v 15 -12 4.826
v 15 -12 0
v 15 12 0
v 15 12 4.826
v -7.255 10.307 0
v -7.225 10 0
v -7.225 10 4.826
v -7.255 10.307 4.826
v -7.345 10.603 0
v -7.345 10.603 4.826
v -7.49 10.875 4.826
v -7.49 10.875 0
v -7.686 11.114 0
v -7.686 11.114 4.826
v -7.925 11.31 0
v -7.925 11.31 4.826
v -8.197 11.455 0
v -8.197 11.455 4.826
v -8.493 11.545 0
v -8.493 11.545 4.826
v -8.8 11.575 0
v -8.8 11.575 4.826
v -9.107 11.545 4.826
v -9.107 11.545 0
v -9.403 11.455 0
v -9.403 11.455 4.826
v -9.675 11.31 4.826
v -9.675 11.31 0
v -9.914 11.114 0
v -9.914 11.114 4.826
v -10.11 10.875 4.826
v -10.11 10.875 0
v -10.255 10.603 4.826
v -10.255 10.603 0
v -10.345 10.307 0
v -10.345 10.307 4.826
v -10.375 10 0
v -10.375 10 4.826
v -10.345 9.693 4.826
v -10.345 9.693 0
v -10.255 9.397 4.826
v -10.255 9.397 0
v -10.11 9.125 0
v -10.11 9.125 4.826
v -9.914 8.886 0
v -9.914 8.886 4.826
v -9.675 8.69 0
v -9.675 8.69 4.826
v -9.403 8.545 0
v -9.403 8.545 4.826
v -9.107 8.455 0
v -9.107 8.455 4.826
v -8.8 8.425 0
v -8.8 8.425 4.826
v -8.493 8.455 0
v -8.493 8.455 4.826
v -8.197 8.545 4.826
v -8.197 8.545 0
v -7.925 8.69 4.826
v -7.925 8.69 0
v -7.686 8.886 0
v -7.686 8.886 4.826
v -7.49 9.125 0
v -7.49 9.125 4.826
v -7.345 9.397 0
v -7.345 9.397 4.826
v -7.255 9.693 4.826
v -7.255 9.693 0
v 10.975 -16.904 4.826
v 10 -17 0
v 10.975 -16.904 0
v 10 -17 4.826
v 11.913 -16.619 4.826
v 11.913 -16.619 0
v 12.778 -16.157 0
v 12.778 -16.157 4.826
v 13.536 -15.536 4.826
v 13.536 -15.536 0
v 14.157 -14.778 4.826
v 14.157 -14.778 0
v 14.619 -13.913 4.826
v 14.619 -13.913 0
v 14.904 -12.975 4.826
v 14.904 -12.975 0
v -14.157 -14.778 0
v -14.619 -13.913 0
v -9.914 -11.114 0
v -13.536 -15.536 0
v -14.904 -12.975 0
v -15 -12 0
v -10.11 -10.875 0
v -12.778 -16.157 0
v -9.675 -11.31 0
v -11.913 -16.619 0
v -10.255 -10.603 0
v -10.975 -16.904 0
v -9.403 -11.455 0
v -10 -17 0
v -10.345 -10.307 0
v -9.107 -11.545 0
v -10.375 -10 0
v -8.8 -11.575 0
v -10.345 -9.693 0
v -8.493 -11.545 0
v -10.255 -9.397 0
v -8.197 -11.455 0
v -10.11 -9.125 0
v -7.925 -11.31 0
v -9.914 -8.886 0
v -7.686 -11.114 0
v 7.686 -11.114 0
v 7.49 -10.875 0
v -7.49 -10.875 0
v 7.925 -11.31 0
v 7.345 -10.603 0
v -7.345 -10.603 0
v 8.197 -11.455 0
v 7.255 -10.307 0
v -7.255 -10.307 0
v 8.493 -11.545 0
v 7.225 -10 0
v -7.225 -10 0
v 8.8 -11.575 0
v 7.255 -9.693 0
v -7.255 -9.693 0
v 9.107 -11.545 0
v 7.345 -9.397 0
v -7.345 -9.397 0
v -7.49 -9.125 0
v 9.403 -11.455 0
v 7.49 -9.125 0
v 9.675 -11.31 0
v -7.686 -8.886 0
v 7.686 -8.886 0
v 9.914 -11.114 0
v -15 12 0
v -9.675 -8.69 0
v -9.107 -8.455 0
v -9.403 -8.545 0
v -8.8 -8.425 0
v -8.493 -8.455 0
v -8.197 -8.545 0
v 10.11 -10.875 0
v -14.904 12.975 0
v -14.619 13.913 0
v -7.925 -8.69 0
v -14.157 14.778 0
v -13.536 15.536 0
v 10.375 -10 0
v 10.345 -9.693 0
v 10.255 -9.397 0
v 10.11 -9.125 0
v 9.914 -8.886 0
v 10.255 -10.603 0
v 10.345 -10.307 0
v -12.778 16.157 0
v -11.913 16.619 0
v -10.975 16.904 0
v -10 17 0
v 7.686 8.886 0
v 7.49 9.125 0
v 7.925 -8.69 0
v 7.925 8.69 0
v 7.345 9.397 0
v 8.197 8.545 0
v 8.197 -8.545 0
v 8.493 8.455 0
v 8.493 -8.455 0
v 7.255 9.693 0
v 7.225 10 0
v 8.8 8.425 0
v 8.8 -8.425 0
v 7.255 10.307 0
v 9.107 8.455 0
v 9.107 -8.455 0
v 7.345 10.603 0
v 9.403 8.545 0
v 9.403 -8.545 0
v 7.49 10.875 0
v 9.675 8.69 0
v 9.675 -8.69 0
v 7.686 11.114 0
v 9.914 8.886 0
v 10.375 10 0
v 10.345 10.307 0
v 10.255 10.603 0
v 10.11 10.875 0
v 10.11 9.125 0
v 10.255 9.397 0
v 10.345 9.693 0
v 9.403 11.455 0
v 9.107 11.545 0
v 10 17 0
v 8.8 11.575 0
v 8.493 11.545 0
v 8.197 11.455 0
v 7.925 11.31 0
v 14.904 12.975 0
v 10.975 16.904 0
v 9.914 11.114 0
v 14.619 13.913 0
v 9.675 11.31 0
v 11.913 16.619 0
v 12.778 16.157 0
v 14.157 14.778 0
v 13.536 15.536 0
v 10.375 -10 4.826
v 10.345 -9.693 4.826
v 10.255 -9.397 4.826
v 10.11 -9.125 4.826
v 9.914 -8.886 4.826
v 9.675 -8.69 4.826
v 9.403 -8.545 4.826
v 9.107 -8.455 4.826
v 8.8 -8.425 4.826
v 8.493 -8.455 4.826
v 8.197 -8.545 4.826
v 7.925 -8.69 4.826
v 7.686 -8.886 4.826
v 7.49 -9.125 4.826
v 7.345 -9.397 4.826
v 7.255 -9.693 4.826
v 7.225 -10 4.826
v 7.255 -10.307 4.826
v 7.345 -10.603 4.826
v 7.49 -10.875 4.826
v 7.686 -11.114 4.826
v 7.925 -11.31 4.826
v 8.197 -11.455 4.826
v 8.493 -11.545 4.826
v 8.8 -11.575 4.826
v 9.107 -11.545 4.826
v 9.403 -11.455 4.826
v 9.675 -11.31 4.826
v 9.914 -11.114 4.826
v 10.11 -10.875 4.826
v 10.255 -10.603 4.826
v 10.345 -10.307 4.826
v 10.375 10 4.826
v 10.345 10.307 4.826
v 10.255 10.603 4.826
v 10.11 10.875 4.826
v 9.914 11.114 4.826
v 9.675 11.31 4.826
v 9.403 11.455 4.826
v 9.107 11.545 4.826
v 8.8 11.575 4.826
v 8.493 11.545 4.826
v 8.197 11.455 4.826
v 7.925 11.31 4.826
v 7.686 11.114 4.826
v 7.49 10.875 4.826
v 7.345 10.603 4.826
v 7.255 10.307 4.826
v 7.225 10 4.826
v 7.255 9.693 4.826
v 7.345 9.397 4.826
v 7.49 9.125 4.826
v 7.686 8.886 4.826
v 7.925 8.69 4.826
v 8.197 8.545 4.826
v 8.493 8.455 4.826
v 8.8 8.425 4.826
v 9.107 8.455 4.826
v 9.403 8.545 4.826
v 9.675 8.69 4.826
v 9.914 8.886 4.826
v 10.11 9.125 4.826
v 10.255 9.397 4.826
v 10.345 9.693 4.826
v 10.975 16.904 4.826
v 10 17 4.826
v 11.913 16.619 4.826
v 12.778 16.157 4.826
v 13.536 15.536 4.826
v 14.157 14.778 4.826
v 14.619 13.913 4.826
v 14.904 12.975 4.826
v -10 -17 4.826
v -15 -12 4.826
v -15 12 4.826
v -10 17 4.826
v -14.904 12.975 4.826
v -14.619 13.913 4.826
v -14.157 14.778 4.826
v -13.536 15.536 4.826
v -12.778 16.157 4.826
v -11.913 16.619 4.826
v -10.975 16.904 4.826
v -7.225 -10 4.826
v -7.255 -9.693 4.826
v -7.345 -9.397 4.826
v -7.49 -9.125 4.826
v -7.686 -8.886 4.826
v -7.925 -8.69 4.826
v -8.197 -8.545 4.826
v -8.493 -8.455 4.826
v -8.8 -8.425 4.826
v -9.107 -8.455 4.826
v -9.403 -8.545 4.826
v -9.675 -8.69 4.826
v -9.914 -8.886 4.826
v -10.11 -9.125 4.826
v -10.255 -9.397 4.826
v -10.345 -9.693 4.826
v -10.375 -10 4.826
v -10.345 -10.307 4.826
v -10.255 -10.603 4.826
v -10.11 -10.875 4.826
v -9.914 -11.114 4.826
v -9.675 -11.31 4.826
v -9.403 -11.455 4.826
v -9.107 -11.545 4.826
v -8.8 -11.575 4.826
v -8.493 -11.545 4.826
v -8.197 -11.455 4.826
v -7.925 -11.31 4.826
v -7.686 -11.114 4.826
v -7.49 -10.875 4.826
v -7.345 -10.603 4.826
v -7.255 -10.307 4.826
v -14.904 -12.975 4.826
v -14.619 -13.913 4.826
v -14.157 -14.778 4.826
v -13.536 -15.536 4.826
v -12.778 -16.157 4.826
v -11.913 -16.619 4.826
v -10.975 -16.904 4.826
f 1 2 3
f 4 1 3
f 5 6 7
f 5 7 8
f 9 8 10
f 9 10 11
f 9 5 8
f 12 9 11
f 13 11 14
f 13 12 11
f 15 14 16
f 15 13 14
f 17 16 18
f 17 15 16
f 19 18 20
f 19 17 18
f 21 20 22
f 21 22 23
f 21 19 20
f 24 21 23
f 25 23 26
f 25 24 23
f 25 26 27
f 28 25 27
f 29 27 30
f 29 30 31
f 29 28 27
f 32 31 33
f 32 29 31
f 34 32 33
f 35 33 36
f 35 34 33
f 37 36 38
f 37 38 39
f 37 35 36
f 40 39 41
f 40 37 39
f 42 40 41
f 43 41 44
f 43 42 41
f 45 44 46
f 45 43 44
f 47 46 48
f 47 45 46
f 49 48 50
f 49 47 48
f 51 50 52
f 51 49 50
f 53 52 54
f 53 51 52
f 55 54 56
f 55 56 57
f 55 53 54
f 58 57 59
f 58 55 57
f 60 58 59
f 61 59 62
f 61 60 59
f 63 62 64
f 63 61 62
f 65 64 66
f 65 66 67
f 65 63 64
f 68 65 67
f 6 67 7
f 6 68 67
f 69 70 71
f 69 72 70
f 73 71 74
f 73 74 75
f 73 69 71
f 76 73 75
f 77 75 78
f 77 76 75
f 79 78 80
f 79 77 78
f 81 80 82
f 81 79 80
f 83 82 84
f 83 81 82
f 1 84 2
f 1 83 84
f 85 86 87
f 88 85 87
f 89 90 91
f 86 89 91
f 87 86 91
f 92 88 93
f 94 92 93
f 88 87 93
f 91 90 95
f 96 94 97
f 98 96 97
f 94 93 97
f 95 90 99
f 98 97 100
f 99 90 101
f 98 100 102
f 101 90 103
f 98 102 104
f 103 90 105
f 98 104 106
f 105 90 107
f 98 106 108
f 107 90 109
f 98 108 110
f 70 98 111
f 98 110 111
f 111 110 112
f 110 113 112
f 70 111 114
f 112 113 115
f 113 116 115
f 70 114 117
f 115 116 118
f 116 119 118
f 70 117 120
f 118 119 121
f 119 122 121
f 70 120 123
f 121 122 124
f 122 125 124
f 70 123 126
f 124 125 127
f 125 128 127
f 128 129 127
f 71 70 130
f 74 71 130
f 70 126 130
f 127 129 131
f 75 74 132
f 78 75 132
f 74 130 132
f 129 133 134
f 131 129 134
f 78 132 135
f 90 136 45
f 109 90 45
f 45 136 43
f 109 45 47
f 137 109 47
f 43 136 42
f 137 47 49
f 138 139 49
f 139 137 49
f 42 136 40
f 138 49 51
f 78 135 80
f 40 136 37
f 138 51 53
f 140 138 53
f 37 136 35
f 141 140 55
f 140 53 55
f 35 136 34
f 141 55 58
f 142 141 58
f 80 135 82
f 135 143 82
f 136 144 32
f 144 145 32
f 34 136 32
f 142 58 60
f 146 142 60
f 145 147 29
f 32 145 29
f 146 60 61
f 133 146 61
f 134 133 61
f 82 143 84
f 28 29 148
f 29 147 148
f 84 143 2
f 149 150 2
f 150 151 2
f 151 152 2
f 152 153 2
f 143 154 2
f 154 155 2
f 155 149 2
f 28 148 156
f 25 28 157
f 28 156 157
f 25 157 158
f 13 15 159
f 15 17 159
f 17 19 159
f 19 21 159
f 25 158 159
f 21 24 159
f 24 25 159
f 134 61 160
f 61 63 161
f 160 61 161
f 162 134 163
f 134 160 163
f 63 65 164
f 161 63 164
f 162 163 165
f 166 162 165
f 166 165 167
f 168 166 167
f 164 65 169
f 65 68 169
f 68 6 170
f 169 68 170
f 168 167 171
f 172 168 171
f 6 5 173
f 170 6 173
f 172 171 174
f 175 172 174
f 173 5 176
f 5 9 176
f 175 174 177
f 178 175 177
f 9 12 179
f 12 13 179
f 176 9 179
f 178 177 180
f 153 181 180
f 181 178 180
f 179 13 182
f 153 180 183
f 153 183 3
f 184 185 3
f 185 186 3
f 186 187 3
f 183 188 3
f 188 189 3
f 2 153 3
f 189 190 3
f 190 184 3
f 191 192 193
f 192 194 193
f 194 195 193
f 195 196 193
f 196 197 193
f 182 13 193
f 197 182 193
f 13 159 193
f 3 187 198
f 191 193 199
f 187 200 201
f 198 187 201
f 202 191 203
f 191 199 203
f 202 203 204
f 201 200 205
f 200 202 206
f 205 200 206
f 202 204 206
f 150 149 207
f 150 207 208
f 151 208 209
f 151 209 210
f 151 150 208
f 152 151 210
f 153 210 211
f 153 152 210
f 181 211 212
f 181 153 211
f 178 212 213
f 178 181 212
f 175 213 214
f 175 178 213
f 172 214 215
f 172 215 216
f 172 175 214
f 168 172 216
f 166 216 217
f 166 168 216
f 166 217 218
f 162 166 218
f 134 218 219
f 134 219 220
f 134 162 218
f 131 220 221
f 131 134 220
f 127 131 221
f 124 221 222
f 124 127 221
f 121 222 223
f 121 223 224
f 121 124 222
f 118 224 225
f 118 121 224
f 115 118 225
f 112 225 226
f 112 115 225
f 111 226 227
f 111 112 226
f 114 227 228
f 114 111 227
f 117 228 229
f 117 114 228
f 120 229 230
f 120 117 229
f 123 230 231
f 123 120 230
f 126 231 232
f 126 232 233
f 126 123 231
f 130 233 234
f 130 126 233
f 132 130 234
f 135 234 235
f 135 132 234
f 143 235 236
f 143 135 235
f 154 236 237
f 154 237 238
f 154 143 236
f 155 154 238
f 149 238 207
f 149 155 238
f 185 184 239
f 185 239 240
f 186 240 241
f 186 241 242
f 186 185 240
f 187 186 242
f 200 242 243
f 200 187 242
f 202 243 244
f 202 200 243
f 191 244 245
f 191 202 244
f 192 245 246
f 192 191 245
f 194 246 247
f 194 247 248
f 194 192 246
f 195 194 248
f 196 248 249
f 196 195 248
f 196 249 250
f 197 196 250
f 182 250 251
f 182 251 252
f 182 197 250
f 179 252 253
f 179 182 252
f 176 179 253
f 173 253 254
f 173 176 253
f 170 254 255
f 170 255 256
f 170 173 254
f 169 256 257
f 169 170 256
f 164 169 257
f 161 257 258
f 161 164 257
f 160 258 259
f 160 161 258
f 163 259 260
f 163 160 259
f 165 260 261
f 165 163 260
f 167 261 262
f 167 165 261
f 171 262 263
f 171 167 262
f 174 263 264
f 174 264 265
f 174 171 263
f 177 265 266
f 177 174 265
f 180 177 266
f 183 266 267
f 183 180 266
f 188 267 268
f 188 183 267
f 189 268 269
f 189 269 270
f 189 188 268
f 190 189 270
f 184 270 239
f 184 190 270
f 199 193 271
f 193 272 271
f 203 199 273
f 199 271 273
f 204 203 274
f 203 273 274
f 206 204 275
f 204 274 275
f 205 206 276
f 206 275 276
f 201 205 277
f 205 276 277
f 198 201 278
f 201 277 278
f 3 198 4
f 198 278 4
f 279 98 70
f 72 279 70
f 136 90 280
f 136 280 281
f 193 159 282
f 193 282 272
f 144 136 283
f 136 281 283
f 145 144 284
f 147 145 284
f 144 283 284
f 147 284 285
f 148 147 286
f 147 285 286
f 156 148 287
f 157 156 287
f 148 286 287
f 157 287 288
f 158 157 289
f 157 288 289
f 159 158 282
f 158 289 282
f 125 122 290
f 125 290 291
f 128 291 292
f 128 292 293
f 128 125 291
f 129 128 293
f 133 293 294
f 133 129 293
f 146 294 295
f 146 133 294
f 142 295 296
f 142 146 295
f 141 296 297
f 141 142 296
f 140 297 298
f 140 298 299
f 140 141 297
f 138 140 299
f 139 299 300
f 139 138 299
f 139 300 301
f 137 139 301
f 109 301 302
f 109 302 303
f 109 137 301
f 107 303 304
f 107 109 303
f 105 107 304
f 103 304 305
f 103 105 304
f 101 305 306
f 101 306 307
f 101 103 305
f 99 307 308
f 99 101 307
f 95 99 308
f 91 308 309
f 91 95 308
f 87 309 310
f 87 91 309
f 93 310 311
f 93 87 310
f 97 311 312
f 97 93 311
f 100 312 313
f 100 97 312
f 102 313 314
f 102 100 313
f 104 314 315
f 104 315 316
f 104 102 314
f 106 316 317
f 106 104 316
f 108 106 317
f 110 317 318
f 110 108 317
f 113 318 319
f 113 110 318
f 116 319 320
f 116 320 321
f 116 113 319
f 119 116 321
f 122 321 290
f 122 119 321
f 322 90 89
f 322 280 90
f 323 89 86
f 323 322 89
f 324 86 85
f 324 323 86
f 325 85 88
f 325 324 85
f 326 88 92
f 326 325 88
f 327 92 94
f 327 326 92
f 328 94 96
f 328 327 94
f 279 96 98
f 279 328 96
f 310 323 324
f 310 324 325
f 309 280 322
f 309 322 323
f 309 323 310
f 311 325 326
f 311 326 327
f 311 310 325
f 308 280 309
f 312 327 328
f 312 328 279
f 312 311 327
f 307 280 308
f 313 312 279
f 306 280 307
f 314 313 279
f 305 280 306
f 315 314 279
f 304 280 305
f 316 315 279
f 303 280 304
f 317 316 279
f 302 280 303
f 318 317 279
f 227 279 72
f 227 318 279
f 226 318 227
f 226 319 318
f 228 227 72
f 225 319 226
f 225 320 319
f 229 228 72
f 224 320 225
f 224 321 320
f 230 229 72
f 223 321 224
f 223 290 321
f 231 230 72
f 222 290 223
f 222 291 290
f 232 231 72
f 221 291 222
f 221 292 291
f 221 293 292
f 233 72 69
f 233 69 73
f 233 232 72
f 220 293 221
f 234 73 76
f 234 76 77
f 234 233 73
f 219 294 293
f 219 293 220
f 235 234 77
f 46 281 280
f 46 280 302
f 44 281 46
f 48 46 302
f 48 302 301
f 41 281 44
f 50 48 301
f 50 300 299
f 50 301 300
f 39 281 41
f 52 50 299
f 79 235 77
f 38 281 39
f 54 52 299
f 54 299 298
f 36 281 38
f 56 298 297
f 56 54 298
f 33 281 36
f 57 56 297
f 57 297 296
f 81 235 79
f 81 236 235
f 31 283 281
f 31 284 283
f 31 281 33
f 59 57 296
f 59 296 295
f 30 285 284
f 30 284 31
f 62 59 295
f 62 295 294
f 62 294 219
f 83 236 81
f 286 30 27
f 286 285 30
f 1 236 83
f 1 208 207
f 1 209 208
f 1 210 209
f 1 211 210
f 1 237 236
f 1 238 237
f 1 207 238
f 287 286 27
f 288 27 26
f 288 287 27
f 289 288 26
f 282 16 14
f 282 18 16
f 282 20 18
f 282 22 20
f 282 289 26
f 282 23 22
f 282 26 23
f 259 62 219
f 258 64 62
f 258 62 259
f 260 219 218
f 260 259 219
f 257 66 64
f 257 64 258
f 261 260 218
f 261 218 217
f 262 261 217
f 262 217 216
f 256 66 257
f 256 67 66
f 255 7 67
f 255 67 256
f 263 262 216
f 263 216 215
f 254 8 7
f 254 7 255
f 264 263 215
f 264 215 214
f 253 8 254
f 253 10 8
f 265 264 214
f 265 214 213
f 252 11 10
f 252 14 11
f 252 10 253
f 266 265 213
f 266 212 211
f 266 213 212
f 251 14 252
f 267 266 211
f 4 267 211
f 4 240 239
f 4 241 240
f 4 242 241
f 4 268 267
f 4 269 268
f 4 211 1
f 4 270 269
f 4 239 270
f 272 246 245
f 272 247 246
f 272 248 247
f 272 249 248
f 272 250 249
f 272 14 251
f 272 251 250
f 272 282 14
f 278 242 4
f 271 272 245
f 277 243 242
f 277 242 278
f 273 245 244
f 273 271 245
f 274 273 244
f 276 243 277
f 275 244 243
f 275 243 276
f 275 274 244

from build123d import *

# Parameters (mm, degrees)
F0_W     = 30
F0_H     = 34
F0_R     = 1.575
F1_DEPTH = 4.826
F2_R     = 5


with BuildPart() as f1:
    # F0 (on Top) → F1 (new body)
    with BuildSketch(Plane.XY):
        Rectangle(F0_W, F0_H)
        with Locations((-8.8, -10)):
            Circle(F0_R, mode=Mode.SUBTRACT)
        with Locations((8.8, -10)):
            Circle(F0_R, mode=Mode.SUBTRACT)
        with Locations((-8.8, 10)):
            Circle(F0_R, mode=Mode.SUBTRACT)
        with Locations((8.8, 10)):
            Circle(F0_R, mode=Mode.SUBTRACT)
    extrude(amount=F1_DEPTH)

    # F2
    f2_edges = [f1.edges().sort_by_distance(p)[0] for p in [
        (-15, -17, 2.413),
        (15, -17, 2.413),
        (-15, 17, 2.413),
        (15, 17, 2.413),
    ]]
    fillet(f2_edges, radius=F2_R)


solid = f1.part
